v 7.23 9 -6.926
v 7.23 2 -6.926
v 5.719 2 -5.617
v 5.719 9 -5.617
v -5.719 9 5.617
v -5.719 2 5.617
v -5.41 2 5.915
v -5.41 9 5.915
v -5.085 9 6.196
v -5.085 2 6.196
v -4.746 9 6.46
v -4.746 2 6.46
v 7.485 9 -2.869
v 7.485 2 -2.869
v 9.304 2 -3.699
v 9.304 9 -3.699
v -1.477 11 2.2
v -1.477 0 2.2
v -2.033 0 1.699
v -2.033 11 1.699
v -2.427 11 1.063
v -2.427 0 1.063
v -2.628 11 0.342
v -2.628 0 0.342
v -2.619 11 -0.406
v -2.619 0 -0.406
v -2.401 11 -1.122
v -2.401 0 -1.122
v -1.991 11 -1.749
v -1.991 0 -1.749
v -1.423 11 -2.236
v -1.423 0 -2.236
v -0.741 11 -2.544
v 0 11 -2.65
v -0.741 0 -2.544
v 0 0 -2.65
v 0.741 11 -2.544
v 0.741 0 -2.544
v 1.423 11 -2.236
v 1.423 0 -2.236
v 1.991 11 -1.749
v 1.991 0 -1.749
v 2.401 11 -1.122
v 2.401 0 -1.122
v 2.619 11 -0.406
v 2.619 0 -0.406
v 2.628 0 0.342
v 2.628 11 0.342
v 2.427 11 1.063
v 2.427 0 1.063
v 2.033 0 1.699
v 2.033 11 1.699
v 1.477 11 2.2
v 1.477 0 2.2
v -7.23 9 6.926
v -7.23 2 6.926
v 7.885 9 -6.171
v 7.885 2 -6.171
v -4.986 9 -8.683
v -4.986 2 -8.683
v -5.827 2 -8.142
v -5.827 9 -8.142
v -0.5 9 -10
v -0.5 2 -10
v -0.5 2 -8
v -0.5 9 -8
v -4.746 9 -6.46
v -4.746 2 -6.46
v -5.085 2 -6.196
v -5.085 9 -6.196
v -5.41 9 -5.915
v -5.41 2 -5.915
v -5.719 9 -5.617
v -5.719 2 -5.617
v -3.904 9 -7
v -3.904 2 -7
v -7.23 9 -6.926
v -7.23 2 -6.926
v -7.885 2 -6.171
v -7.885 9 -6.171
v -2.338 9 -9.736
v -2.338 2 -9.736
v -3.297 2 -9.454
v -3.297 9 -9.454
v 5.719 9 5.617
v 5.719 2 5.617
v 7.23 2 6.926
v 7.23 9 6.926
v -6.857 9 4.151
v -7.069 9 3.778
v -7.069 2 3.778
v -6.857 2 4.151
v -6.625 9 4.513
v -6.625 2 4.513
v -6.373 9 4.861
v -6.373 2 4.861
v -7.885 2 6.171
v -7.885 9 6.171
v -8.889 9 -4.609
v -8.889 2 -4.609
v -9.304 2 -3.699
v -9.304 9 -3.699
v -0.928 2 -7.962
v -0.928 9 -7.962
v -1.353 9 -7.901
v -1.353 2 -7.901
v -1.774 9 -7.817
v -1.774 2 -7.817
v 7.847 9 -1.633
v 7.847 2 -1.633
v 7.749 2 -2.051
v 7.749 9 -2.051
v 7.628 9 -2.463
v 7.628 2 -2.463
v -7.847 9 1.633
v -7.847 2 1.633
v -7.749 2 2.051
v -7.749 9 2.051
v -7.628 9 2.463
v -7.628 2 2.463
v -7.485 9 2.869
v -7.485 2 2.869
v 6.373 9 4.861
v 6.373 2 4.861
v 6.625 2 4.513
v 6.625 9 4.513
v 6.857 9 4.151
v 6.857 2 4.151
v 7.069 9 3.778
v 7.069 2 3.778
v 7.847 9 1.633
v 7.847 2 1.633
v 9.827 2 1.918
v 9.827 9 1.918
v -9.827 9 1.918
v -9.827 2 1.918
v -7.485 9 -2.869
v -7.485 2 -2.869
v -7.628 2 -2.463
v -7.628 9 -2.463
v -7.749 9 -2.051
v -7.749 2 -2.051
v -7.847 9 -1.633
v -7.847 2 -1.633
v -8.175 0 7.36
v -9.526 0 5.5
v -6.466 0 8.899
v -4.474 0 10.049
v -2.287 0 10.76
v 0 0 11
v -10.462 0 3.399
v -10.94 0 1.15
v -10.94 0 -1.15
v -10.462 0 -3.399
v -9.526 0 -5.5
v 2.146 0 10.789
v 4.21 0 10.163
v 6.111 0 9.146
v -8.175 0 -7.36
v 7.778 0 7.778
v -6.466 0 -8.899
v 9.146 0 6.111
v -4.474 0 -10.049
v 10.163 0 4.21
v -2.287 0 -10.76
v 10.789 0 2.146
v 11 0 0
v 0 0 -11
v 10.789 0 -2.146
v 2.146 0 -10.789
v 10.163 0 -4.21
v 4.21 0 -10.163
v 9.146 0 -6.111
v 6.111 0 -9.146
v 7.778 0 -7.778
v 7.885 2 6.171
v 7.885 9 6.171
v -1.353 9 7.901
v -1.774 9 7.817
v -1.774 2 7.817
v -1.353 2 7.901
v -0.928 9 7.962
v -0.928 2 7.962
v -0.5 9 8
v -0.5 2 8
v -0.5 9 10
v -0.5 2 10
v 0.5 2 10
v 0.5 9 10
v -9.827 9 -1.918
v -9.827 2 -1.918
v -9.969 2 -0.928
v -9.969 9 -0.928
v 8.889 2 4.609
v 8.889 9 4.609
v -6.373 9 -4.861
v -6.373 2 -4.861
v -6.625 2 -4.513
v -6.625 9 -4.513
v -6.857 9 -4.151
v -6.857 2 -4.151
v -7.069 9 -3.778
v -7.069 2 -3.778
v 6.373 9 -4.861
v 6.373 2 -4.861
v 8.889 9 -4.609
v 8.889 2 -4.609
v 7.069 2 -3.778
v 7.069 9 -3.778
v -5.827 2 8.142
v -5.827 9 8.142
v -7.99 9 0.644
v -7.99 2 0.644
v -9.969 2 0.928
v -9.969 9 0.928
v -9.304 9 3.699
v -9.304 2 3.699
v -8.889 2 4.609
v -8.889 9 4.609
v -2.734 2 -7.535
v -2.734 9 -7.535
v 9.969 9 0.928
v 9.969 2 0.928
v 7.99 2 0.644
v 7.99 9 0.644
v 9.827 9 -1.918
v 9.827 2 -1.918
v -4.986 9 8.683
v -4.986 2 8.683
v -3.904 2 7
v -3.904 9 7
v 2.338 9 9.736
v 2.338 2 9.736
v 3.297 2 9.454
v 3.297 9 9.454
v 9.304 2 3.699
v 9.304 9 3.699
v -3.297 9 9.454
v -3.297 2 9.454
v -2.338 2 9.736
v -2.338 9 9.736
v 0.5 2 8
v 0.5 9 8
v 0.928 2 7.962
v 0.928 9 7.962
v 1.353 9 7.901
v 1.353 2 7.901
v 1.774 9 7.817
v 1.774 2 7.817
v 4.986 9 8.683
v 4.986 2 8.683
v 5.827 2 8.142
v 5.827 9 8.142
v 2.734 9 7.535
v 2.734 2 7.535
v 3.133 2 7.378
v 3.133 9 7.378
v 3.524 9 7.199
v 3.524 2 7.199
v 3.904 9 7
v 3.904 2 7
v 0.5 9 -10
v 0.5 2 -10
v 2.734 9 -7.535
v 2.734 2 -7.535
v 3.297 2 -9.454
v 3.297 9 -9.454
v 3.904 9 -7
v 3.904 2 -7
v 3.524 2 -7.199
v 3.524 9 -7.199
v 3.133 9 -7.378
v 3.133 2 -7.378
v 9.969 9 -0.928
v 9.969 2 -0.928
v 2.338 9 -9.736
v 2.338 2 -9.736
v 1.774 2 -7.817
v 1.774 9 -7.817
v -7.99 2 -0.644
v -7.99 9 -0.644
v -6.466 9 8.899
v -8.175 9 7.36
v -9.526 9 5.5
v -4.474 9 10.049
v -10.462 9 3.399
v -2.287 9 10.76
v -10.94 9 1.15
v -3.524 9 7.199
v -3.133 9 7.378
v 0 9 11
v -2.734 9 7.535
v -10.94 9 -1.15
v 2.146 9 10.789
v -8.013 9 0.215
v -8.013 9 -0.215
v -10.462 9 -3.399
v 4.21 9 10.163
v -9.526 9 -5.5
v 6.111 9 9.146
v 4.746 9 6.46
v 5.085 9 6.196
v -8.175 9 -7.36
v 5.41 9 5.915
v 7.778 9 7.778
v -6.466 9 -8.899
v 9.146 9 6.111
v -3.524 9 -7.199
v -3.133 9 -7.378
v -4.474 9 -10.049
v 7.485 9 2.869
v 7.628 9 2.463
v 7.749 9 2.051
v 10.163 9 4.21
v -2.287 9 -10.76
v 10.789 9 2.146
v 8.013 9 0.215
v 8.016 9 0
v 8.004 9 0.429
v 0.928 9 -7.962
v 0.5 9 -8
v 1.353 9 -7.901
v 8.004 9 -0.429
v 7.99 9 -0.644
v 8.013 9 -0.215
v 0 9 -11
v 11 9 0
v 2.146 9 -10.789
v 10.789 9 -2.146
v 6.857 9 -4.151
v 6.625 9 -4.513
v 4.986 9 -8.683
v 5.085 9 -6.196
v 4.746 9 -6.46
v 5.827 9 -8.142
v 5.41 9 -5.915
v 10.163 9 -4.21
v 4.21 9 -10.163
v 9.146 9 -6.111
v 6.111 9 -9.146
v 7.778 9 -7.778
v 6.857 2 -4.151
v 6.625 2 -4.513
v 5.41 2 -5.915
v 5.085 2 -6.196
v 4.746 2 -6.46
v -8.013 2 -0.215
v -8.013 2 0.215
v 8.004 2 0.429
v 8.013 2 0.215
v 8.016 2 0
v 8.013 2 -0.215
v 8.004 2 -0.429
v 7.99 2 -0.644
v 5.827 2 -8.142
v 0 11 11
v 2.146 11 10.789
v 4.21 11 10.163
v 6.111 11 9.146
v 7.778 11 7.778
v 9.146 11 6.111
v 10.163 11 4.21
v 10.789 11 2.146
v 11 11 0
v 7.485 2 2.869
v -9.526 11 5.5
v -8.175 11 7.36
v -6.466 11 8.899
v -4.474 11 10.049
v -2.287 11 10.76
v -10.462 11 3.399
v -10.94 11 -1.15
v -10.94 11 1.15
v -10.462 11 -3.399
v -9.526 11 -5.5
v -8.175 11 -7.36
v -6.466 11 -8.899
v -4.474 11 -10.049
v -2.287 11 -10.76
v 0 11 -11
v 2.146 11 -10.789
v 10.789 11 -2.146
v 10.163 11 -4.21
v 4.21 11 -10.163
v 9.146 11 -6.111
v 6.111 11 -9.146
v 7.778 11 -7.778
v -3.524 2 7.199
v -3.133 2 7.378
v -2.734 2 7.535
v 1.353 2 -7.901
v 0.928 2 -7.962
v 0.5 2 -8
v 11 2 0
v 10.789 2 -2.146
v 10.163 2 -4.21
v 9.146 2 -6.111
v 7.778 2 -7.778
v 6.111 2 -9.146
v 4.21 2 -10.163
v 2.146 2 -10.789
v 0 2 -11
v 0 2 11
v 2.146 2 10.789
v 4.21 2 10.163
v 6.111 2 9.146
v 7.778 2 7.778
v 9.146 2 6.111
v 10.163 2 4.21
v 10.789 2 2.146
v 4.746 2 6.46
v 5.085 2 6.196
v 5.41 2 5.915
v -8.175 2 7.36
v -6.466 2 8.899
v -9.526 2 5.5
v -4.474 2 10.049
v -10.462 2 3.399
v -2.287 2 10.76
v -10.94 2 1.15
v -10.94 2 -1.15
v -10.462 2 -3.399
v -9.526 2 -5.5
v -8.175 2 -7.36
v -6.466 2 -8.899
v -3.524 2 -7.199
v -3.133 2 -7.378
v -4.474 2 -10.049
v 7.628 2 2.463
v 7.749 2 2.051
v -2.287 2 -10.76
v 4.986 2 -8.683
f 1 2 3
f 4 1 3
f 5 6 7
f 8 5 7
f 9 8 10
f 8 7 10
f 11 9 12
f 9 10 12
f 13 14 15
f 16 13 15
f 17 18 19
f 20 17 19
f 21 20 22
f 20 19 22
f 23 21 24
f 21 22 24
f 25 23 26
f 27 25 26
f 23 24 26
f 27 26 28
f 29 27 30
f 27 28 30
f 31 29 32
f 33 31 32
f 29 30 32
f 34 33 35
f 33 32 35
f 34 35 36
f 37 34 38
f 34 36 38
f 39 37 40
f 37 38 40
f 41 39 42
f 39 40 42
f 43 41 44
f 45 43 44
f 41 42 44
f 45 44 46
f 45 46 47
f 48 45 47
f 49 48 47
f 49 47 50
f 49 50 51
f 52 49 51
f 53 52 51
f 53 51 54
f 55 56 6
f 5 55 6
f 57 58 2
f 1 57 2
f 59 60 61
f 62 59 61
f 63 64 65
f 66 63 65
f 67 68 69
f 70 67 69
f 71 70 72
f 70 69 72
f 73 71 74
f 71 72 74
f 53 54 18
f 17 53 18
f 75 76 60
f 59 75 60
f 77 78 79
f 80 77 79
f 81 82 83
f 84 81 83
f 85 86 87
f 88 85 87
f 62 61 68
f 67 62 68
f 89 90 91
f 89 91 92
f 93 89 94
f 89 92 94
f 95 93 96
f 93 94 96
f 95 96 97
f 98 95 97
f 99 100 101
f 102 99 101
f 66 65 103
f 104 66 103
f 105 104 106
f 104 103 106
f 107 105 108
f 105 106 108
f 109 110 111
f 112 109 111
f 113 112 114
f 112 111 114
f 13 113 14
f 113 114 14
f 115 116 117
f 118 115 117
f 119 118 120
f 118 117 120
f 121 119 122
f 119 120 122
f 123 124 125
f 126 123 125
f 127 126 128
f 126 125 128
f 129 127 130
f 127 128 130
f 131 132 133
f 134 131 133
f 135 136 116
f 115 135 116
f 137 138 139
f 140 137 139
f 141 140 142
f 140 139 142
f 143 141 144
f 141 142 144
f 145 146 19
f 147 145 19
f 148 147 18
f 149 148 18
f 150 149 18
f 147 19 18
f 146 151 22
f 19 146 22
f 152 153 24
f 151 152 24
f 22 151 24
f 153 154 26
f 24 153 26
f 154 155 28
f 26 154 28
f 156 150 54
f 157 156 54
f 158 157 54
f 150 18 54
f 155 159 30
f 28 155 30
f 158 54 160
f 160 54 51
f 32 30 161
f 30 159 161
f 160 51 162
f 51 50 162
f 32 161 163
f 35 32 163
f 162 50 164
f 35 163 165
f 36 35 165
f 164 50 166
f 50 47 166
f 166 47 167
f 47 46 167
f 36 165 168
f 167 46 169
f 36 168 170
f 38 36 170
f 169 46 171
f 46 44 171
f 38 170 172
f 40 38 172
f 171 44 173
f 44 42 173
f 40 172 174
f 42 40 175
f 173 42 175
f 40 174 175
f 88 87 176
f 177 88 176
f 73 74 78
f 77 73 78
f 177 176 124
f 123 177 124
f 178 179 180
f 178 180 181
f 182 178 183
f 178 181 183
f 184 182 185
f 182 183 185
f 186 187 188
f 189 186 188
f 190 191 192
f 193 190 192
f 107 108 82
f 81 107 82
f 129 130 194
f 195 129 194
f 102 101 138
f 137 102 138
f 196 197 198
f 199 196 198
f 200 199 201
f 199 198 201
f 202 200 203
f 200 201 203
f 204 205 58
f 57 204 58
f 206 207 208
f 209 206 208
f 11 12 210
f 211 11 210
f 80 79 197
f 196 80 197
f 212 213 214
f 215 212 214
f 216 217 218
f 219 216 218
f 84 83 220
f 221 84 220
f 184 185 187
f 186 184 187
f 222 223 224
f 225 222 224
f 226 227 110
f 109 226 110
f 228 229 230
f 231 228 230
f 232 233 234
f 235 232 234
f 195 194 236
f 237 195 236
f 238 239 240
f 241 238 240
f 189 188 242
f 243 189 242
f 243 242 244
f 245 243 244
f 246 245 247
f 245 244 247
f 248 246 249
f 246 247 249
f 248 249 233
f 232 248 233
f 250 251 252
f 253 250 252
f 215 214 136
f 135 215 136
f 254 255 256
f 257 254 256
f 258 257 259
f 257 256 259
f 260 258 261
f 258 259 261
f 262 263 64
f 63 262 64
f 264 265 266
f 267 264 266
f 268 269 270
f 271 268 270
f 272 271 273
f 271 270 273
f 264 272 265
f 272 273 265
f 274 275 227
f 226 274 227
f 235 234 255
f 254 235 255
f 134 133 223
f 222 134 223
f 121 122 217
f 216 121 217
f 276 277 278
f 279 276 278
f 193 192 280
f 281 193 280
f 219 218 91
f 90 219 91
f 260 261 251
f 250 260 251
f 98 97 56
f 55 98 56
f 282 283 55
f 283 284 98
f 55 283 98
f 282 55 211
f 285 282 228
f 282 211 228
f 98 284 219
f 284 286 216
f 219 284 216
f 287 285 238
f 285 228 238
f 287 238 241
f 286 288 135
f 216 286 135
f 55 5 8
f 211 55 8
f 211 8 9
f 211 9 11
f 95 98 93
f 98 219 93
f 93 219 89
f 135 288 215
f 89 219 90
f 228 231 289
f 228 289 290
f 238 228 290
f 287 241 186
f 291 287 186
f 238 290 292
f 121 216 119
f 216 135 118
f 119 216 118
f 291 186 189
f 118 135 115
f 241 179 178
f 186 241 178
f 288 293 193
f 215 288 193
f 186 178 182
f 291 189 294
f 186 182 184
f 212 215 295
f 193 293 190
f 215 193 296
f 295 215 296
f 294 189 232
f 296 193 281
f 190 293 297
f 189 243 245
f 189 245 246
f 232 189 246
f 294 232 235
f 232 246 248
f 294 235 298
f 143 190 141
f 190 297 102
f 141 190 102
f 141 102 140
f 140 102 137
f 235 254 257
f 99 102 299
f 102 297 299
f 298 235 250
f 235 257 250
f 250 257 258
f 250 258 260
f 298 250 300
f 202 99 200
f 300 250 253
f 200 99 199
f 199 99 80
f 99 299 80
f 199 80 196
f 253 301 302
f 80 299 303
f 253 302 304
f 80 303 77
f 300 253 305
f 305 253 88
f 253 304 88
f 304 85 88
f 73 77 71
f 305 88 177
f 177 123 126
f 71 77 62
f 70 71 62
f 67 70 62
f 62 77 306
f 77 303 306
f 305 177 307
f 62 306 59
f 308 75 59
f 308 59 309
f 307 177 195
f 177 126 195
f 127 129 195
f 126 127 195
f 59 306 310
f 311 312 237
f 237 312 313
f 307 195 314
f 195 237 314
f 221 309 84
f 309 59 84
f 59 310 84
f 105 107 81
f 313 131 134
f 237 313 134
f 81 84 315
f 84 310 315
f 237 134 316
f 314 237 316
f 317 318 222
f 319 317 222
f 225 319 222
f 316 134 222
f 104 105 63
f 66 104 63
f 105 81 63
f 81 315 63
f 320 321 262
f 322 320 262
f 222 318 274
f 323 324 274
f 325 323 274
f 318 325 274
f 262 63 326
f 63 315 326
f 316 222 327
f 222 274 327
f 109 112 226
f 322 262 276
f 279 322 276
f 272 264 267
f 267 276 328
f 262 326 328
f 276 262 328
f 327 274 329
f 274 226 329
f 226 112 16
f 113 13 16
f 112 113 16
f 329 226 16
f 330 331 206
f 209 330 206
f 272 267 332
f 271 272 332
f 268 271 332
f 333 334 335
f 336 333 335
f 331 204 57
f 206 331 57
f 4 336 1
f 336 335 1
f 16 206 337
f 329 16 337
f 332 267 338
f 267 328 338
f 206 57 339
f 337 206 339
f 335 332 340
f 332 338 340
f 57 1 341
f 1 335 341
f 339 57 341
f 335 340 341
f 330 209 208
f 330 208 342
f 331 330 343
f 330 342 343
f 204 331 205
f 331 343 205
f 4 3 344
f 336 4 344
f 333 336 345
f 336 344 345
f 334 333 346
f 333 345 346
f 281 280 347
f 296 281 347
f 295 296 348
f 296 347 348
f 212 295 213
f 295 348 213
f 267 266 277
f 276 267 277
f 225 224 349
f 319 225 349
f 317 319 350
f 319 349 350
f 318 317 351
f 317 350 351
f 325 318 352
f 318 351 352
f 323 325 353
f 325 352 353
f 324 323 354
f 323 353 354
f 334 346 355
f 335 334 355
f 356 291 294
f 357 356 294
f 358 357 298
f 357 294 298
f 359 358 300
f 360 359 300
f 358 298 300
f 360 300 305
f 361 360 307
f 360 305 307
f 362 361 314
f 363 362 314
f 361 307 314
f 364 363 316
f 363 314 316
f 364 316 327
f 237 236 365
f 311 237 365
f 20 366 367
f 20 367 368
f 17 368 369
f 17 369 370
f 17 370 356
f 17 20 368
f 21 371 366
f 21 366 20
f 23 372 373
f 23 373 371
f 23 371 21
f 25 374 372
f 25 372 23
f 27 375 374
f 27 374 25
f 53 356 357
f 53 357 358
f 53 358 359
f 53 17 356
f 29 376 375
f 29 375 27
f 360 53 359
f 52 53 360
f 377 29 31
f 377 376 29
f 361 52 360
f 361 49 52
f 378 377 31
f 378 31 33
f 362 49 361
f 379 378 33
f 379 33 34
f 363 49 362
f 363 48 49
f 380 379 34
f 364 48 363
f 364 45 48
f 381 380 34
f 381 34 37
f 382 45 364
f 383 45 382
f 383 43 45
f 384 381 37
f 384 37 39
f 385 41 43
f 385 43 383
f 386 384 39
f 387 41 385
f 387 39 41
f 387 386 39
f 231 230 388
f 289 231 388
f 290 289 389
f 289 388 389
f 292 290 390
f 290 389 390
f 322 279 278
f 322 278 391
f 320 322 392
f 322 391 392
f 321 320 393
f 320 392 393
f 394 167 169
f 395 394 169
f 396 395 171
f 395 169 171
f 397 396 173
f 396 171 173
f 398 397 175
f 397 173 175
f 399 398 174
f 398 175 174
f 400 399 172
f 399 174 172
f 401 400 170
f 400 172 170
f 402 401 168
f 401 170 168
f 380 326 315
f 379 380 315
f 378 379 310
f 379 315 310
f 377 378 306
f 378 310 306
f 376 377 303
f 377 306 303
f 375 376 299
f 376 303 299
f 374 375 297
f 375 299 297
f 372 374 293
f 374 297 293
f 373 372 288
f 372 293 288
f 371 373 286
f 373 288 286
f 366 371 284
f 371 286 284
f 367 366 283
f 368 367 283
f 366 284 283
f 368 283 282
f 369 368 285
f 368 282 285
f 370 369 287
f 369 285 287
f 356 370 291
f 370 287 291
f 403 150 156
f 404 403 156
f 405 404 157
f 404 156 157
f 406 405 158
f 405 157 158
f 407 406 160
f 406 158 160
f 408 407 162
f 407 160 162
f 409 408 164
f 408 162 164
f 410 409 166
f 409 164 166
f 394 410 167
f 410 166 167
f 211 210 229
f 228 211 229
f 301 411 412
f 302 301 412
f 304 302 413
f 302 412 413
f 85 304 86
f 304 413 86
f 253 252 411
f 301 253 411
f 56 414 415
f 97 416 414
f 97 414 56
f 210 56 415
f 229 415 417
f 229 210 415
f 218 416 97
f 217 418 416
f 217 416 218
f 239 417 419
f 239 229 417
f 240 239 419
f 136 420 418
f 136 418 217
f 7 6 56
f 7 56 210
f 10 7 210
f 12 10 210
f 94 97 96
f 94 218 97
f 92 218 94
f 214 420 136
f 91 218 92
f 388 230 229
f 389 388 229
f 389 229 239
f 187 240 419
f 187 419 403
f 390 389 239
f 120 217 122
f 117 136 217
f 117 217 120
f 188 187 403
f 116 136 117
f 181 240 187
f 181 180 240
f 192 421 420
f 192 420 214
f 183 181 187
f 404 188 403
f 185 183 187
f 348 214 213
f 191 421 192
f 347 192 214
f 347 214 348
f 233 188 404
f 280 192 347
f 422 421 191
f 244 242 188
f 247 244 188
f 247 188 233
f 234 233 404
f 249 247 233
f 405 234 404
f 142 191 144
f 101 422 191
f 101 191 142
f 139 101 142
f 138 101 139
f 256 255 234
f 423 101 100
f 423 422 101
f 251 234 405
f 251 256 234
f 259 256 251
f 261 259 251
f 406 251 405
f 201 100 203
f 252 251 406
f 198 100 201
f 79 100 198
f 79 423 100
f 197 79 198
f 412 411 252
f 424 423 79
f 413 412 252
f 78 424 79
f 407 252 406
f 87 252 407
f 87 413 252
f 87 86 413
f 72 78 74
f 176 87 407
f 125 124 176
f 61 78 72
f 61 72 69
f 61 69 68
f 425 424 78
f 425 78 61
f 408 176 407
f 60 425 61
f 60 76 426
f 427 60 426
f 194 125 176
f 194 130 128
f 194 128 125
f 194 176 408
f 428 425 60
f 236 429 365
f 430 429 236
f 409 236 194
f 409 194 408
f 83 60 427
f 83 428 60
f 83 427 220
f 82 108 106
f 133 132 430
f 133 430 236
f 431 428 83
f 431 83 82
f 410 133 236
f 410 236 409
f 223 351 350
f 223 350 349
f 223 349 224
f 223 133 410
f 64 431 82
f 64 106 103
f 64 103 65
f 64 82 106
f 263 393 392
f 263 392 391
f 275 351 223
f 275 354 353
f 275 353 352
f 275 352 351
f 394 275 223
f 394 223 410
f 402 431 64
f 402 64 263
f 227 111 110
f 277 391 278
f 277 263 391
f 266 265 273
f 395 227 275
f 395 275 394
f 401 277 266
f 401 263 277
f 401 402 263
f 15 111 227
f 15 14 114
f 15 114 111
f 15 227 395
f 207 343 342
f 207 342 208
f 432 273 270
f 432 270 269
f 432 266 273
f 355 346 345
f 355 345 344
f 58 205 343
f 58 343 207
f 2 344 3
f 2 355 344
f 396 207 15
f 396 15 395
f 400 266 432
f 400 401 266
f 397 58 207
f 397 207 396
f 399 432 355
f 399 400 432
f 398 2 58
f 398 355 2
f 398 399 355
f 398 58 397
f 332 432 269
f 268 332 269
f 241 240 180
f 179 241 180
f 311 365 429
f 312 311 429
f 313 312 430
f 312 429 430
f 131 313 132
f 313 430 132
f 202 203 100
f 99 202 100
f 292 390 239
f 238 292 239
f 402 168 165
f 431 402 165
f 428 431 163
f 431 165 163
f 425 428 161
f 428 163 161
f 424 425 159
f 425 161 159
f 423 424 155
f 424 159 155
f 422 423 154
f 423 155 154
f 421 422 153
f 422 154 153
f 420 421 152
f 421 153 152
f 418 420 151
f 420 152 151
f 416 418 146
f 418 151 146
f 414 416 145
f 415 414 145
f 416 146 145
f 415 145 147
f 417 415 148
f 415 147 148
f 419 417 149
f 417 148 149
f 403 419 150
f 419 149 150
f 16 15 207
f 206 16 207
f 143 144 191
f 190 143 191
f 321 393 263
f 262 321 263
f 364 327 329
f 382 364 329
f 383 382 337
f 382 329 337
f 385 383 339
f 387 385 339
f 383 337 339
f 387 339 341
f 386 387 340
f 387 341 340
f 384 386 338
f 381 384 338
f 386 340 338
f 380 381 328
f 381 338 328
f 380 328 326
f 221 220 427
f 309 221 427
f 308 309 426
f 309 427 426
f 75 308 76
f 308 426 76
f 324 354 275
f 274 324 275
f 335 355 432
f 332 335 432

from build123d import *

# Parameters (mm, degrees)
BOSS_EXTRUDE1_DEPTH = 11
BOSS_EXTRUDE2_DEPTH = 2
BOSS_EXTRUDE3_START = 9
BOSS_EXTRUDE3_DEPTH = 2


# Read off the part's stored shape, not the designer's step: Boss-Extrude1
with BuildPart() as part:
    # Boss-Extrude1 outline → Boss-Extrude1 (new body)
    with BuildSketch(Plane(origin=(0, 0, 0), x_dir=(1, 0, 0), z_dir=(0, 1, 0))):
        with BuildLine():
            Line((-0.5, -8), (-0.5, -10))
            Line((-0.5, -10), (0.5, -10))
            Line((0.5, -10), (0.5, -8))
            ThreePointArc((0.5, -8), (1.140740208, -7.934022421), (1.774113968, -7.816810067))
            Line((1.774113968, -7.816810067), (2.337579082, -9.735796015))
            Line((2.337579082, -9.735796015), (3.297072055, -9.454063458))
            Line((3.297072055, -9.454063458), (2.733606942, -7.53507751))
            ThreePointArc((2.733606942, -7.53507751), (3.329804637, -7.29125511), (3.904499773, -7.000348671))
            Line((3.904499773, -7.000348671), (4.985781408, -8.682855737))
            Line((4.985781408, -8.682855737), (5.827034941, -8.14221492))
            Line((5.827034941, -8.14221492), (4.745753306, -6.459707854))
            ThreePointArc((4.745753306, -6.459707854), (5.249108098, -6.057793673), (5.718566228, -5.616760659))
            Line((5.718566228, -5.616760659), (7.230065377, -6.926482127))
            Line((7.230065377, -6.926482127), (7.884926111, -6.170732552))
            Line((7.884926111, -6.170732552), (6.373426962, -4.861011084))
            ThreePointArc((6.373426962, -4.861011084), (6.743160038, -4.333565819), (7.069348456, -3.778136102))
            Line((7.069348456, -3.778136102), (8.888612447, -4.608966128))
            Line((8.888612447, -4.608966128), (9.30402746, -3.699334132))
            Line((9.30402746, -3.699334132), (7.484763469, -2.868504106))
            ThreePointArc((7.484763469, -2.868504106), (7.690921254, -2.258258235), (7.847414116, -1.633429427))
            Line((7.847414116, -1.633429427), (9.827057, -1.918059104))
            Line((9.827057, -1.918059104), (9.969371838, -0.928237662))
            Line((9.969371838, -0.928237662), (7.989728954, -0.643607985))
            ThreePointArc((7.989728954, -0.643607985), (8.015609771, 0), (7.989728954, 0.643607985))
            Line((7.989728954, 0.643607985), (9.969371838, 0.928237662))
            Line((9.969371838, 0.928237662), (9.827057, 1.918059104))
            Line((9.827057, 1.918059104), (7.847414116, 1.633429427))
            ThreePointArc((7.847414116, 1.633429427), (7.690921254, 2.258258235), (7.484763469, 2.868504106))
            Line((7.484763469, 2.868504106), (9.30402746, 3.699334132))
            Line((9.30402746, 3.699334132), (8.888612447, 4.608966128))
            Line((8.888612447, 4.608966128), (7.069348456, 3.778136102))
            ThreePointArc((7.069348456, 3.778136102), (6.743160038, 4.333565819), (6.373426962, 4.861011084))
            Line((6.373426962, 4.861011084), (7.884926111, 6.170732552))
            Line((7.884926111, 6.170732552), (7.230065377, 6.926482127))
            Line((7.230065377, 6.926482127), (5.718566228, 5.616760659))
            ThreePointArc((5.718566228, 5.616760659), (5.249108098, 6.057793673), (4.745753306, 6.459707854))
            Line((4.745753306, 6.459707854), (5.827034941, 8.14221492))
            Line((5.827034941, 8.14221492), (4.985781408, 8.682855737))
            Line((4.985781408, 8.682855737), (3.904499773, 7.000348671))
            ThreePointArc((3.904499773, 7.000348671), (3.329804637, 7.29125511), (2.733606942, 7.53507751))
            Line((2.733606942, 7.53507751), (3.297072055, 9.454063458))
            Line((3.297072055, 9.454063458), (2.337579082, 9.735796015))
            Line((2.337579082, 9.735796015), (1.774113968, 7.816810067))
            ThreePointArc((1.774113968, 7.816810067), (1.140740208, 7.934022421), (0.5, 8))
            Line((0.5, 8), (0.5, 10))
            Line((0.5, 10), (-0.5, 10))
            Line((-0.5, 10), (-0.5, 8))
            ThreePointArc((-0.5, 8), (-1.140740208, 7.934022421), (-1.774113968, 7.816810067))
            Line((-1.774113968, 7.816810067), (-2.337579082, 9.735796015))
            Line((-2.337579082, 9.735796015), (-3.297072055, 9.454063458))
            Line((-3.297072055, 9.454063458), (-2.733606942, 7.53507751))
            ThreePointArc((-2.733606942, 7.53507751), (-3.329804637, 7.29125511), (-3.904499773, 7.000348671))
            Line((-3.904499773, 7.000348671), (-4.985781408, 8.682855737))
            Line((-4.985781408, 8.682855737), (-5.827034941, 8.14221492))
            Line((-5.827034941, 8.14221492), (-4.745753306, 6.459707854))
            ThreePointArc((-4.745753306, 6.459707854), (-5.249108098, 6.057793673), (-5.718566228, 5.616760659))
            Line((-5.718566228, 5.616760659), (-7.230065377, 6.926482127))
            Line((-7.230065377, 6.926482127), (-7.884926111, 6.170732552))
            Line((-7.884926111, 6.170732552), (-6.373426962, 4.861011084))
            ThreePointArc((-6.373426962, 4.861011084), (-6.743160038, 4.333565819), (-7.069348456, 3.778136102))
            Line((-7.069348456, 3.778136102), (-8.888612447, 4.608966128))
            Line((-8.888612447, 4.608966128), (-9.30402746, 3.699334132))
            Line((-9.30402746, 3.699334132), (-7.484763469, 2.868504106))
            ThreePointArc((-7.484763469, 2.868504106), (-7.690921254, 2.258258235), (-7.847414116, 1.633429427))
            Line((-7.847414116, 1.633429427), (-9.827057, 1.918059104))
            Line((-9.827057, 1.918059104), (-9.969371838, 0.928237662))
            Line((-9.969371838, 0.928237662), (-7.989728954, 0.643607985))
            ThreePointArc((-7.989728954, 0.643607985), (-8.015609771, 0), (-7.989728954, -0.643607985))
            Line((-7.989728954, -0.643607985), (-9.969371838, -0.928237662))
            Line((-9.969371838, -0.928237662), (-9.827057, -1.918059104))
            Line((-9.827057, -1.918059104), (-7.847414116, -1.633429427))
            ThreePointArc((-7.847414116, -1.633429427), (-7.690921254, -2.258258235), (-7.484763469, -2.868504106))
            Line((-7.484763469, -2.868504106), (-9.30402746, -3.699334132))
            Line((-9.30402746, -3.699334132), (-8.888612447, -4.608966128))
            Line((-8.888612447, -4.608966128), (-7.069348456, -3.778136102))
            ThreePointArc((-7.069348456, -3.778136102), (-6.743160038, -4.333565819), (-6.373426962, -4.861011084))
            Line((-6.373426962, -4.861011084), (-7.884926111, -6.170732552))
            Line((-7.884926111, -6.170732552), (-7.230065377, -6.926482127))
            Line((-7.230065377, -6.926482127), (-5.718566228, -5.616760659))
            ThreePointArc((-5.718566228, -5.616760659), (-5.249108098, -6.057793673), (-4.745753306, -6.459707854))
            Line((-4.745753306, -6.459707854), (-5.827034941, -8.14221492))
            Line((-5.827034941, -8.14221492), (-4.985781408, -8.682855737))
            Line((-4.985781408, -8.682855737), (-3.904499773, -7.000348671))
            ThreePointArc((-3.904499773, -7.000348671), (-3.329804637, -7.29125511), (-2.733606942, -7.53507751))
            Line((-2.733606942, -7.53507751), (-3.297072055, -9.454063458))
            Line((-3.297072055, -9.454063458), (-2.337579082, -9.735796015))
            Line((-2.337579082, -9.735796015), (-1.774113968, -7.816810067))
            ThreePointArc((-1.774113968, -7.816810067), (-1.140740208, -7.934022421), (-0.5, -8))
        make_face()
        with BuildLine():
            Line((1.47732867, -2.2), (-1.47732867, -2.2))
            ThreePointArc((-1.47732867, -2.2), (0, 2.65), (1.47732867, -2.2))
        make_face(mode=Mode.SUBTRACT)
    extrude(amount=BOSS_EXTRUDE1_DEPTH)

    # Sketch1<6> → Boss-Extrude2 (add)
    with BuildSketch(Plane(origin=(0, 0, 0), x_dir=(1, 0, 0), z_dir=(0, 1, 0))):
        with BuildLine():
            Line((0, 10), (0, 11))
            ThreePointArc((0, 11), (-11, 0), (0, -11))
            Line((0, -11), (0, -10))
            Line((0, -10), (-0.5, -10))
            Line((-0.5, -10), (-0.5, -8))
            ThreePointArc((-0.5, -8), (-1.140740208, -7.934022421), (-1.774113968, -7.816810067))
            Line((-1.774113968, -7.816810067), (-2.337579082, -9.735796015))
            Line((-2.337579082, -9.735796015), (-3.297072055, -9.454063458))
            Line((-3.297072055, -9.454063458), (-2.733606942, -7.53507751))
            ThreePointArc((-2.733606942, -7.53507751), (-3.329804637, -7.29125511), (-3.904499773, -7.000348671))
            Line((-3.904499773, -7.000348671), (-4.985781408, -8.682855737))
            Line((-4.985781408, -8.682855737), (-5.827034941, -8.14221492))
            Line((-5.827034941, -8.14221492), (-4.745753306, -6.459707854))
            ThreePointArc((-4.745753306, -6.459707854), (-5.249108098, -6.057793673), (-5.718566228, -5.616760659))
            Line((-5.718566228, -5.616760659), (-7.230065377, -6.926482127))
            Line((-7.230065377, -6.926482127), (-7.884926111, -6.170732552))
            Line((-7.884926111, -6.170732552), (-6.373426962, -4.861011084))
            ThreePointArc((-6.373426962, -4.861011084), (-6.743160038, -4.333565819), (-7.069348456, -3.778136102))
            Line((-7.069348456, -3.778136102), (-8.888612447, -4.608966128))
            Line((-8.888612447, -4.608966128), (-9.30402746, -3.699334132))
            Line((-9.30402746, -3.699334132), (-7.484763469, -2.868504106))
            ThreePointArc((-7.484763469, -2.868504106), (-7.690921254, -2.258258235), (-7.847414116, -1.633429427))
            Line((-7.847414116, -1.633429427), (-9.827057, -1.918059104))
            Line((-9.827057, -1.918059104), (-9.969371838, -0.928237662))
            Line((-9.969371838, -0.928237662), (-7.989728954, -0.643607985))
            ThreePointArc((-7.989728954, -0.643607985), (-8.015609771, 0), (-7.989728954, 0.643607985))
            Line((-7.989728954, 0.643607985), (-9.969371838, 0.928237662))
            Line((-9.969371838, 0.928237662), (-9.827057, 1.918059104))
            Line((-9.827057, 1.918059104), (-7.847414116, 1.633429427))
            ThreePointArc((-7.847414116, 1.633429427), (-7.690921254, 2.258258235), (-7.484763469, 2.868504106))
            Line((-7.484763469, 2.868504106), (-9.30402746, 3.699334132))
            Line((-9.30402746, 3.699334132), (-8.888612447, 4.608966128))
            Line((-8.888612447, 4.608966128), (-7.069348456, 3.778136102))
            ThreePointArc((-7.069348456, 3.778136102), (-6.743160038, 4.333565819), (-6.373426962, 4.861011084))
            Line((-6.373426962, 4.861011084), (-7.884926111, 6.170732552))
            Line((-7.884926111, 6.170732552), (-7.230065377, 6.926482127))
            Line((-7.230065377, 6.926482127), (-5.718566228, 5.616760659))
            ThreePointArc((-5.718566228, 5.616760659), (-5.249108098, 6.057793673), (-4.745753306, 6.459707854))
            Line((-4.745753306, 6.459707854), (-5.827034941, 8.14221492))
            Line((-5.827034941, 8.14221492), (-4.985781408, 8.682855737))
            Line((-4.985781408, 8.682855737), (-3.904499773, 7.000348671))
            ThreePointArc((-3.904499773, 7.000348671), (-3.329804637, 7.29125511), (-2.733606942, 7.53507751))
            Line((-2.733606942, 7.53507751), (-3.297072055, 9.454063458))
            Line((-3.297072055, 9.454063458), (-2.337579082, 9.735796015))
            Line((-2.337579082, 9.735796015), (-1.774113968, 7.816810067))
            ThreePointArc((-1.774113968, 7.816810067), (-1.140740208, 7.934022421), (-0.5, 8))
            Line((-0.5, 8), (-0.5, 10))
            Line((-0.5, 10), (0, 10))
        make_face()
        with BuildLine():
            ThreePointArc((11, 0), (7.778174593, 7.778174593), (0, 11))
            Line((0, 11), (0, 10))
            Line((0, 10), (0.5, 10))
            Line((0.5, 10), (0.5, 8))
            ThreePointArc((0.5, 8), (1.140740208, 7.934022421), (1.774113968, 7.816810067))
            Line((1.774113968, 7.816810067), (2.337579082, 9.735796015))
            Line((2.337579082, 9.735796015), (3.297072055, 9.454063458))
            Line((3.297072055, 9.454063458), (2.733606942, 7.53507751))
            ThreePointArc((2.733606942, 7.53507751), (3.329804637, 7.29125511), (3.904499773, 7.000348671))
            Line((3.904499773, 7.000348671), (4.985781408, 8.682855737))
            Line((4.985781408, 8.682855737), (5.827034941, 8.14221492))
            Line((5.827034941, 8.14221492), (4.745753306, 6.459707854))
            ThreePointArc((4.745753306, 6.459707854), (5.249108098, 6.057793673), (5.718566228, 5.616760659))
            Line((5.718566228, 5.616760659), (7.230065377, 6.926482127))
            Line((7.230065377, 6.926482127), (7.884926111, 6.170732552))
            Line((7.884926111, 6.170732552), (6.373426962, 4.861011084))
            ThreePointArc((6.373426962, 4.861011084), (6.743160038, 4.333565819), (7.069348456, 3.778136102))
            Line((7.069348456, 3.778136102), (8.888612447, 4.608966128))
            Line((8.888612447, 4.608966128), (9.30402746, 3.699334132))
            Line((9.30402746, 3.699334132), (7.484763469, 2.868504106))
            ThreePointArc((7.484763469, 2.868504106), (7.690921254, 2.258258235), (7.847414116, 1.633429427))
            Line((7.847414116, 1.633429427), (9.827057, 1.918059104))
            Line((9.827057, 1.918059104), (9.969371838, 0.928237662))
            Line((9.969371838, 0.928237662), (7.989728954, 0.643607985))
            ThreePointArc((7.989728954, 0.643607985), (8.009136953, 0.322064068), (8.015609771, 0))
            ThreePointArc((8.015609771, 0), (8.009136953, -0.322064068), (7.989728954, -0.643607985))
            Line((7.989728954, -0.643607985), (9.969371838, -0.928237662))
            Line((9.969371838, -0.928237662), (9.827057, -1.918059104))
            Line((9.827057, -1.918059104), (7.847414116, -1.633429427))
            ThreePointArc((7.847414116, -1.633429427), (7.690921254, -2.258258235), (7.484763469, -2.868504106))
            Line((7.484763469, -2.868504106), (9.30402746, -3.699334132))
            Line((9.30402746, -3.699334132), (8.888612447, -4.608966128))
            Line((8.888612447, -4.608966128), (7.069348456, -3.778136102))
            ThreePointArc((7.069348456, -3.778136102), (6.743160038, -4.333565819), (6.373426962, -4.861011084))
            Line((6.373426962, -4.861011084), (7.884926111, -6.170732552))
            Line((7.884926111, -6.170732552), (7.230065377, -6.926482127))
            Line((7.230065377, -6.926482127), (5.718566228, -5.616760659))
            ThreePointArc((5.718566228, -5.616760659), (5.249108098, -6.057793673), (4.745753306, -6.459707854))
            Line((4.745753306, -6.459707854), (5.827034941, -8.14221492))
            Line((5.827034941, -8.14221492), (4.985781408, -8.682855737))
            Line((4.985781408, -8.682855737), (3.904499773, -7.000348671))
            ThreePointArc((3.904499773, -7.000348671), (3.329804637, -7.29125511), (2.733606942, -7.53507751))
            Line((2.733606942, -7.53507751), (3.297072055, -9.454063458))
            Line((3.297072055, -9.454063458), (2.337579082, -9.735796015))
            Line((2.337579082, -9.735796015), (1.774113968, -7.816810067))
            ThreePointArc((1.774113968, -7.816810067), (1.140740208, -7.934022421), (0.5, -8))
            Line((0.5, -8), (0.5, -10))
            Line((0.5, -10), (0, -10))
            Line((0, -10), (0, -11))
            ThreePointArc((0, -11), (7.778174593, -7.778174593), (11, 0))
        make_face()
    extrude(amount=BOSS_EXTRUDE2_DEPTH)

    # Sketch1<7> → Boss-Extrude3 (add)
    with BuildSketch(Plane(origin=(0, 0, 0), x_dir=(1, 0, 0), z_dir=(0, 1, 0)).offset(BOSS_EXTRUDE3_START)):
        with BuildLine():
            ThreePointArc((11, 0), (7.778174593, 7.778174593), (0, 11))
            Line((0, 11), (0, 10))
            Line((0, 10), (0.5, 10))
            Line((0.5, 10), (0.5, 8))
            ThreePointArc((0.5, 8), (1.140740208, 7.934022421), (1.774113968, 7.816810067))
            Line((1.774113968, 7.816810067), (2.337579082, 9.735796015))
            Line((2.337579082, 9.735796015), (3.297072055, 9.454063458))
            Line((3.297072055, 9.454063458), (2.733606942, 7.53507751))
            ThreePointArc((2.733606942, 7.53507751), (3.329804637, 7.29125511), (3.904499773, 7.000348671))
            Line((3.904499773, 7.000348671), (4.985781408, 8.682855737))
            Line((4.985781408, 8.682855737), (5.827034941, 8.14221492))
            Line((5.827034941, 8.14221492), (4.745753306, 6.459707854))
            ThreePointArc((4.745753306, 6.459707854), (5.249108098, 6.057793673), (5.718566228, 5.616760659))
            Line((5.718566228, 5.616760659), (7.230065377, 6.926482127))
            Line((7.230065377, 6.926482127), (7.884926111, 6.170732552))
            Line((7.884926111, 6.170732552), (6.373426962, 4.861011084))
            ThreePointArc((6.373426962, 4.861011084), (6.743160038, 4.333565819), (7.069348456, 3.778136102))
            Line((7.069348456, 3.778136102), (8.888612447, 4.608966128))
            Line((8.888612447, 4.608966128), (9.30402746, 3.699334132))
            Line((9.30402746, 3.699334132), (7.484763469, 2.868504106))
            ThreePointArc((7.484763469, 2.868504106), (7.690921254, 2.258258235), (7.847414116, 1.633429427))
            Line((7.847414116, 1.633429427), (9.827057, 1.918059104))
            Line((9.827057, 1.918059104), (9.969371838, 0.928237662))
            Line((9.969371838, 0.928237662), (7.989728954, 0.643607985))
            ThreePointArc((7.989728954, 0.643607985), (8.009136953, 0.322064068), (8.015609771, 0))
            ThreePointArc((8.015609771, 0), (8.009136953, -0.322064068), (7.989728954, -0.643607985))
            Line((7.989728954, -0.643607985), (9.969371838, -0.928237662))
            Line((9.969371838, -0.928237662), (9.827057, -1.918059104))
            Line((9.827057, -1.918059104), (7.847414116, -1.633429427))
            ThreePointArc((7.847414116, -1.633429427), (7.690921254, -2.258258235), (7.484763469, -2.868504106))
            Line((7.484763469, -2.868504106), (9.30402746, -3.699334132))
            Line((9.30402746, -3.699334132), (8.888612447, -4.608966128))
            Line((8.888612447, -4.608966128), (7.069348456, -3.778136102))
            ThreePointArc((7.069348456, -3.778136102), (6.743160038, -4.333565819), (6.373426962, -4.861011084))
            Line((6.373426962, -4.861011084), (7.884926111, -6.170732552))
            Line((7.884926111, -6.170732552), (7.230065377, -6.926482127))
            Line((7.230065377, -6.926482127), (5.718566228, -5.616760659))
            ThreePointArc((5.718566228, -5.616760659), (5.249108098, -6.057793673), (4.745753306, -6.459707854))
            Line((4.745753306, -6.459707854), (5.827034941, -8.14221492))
            Line((5.827034941, -8.14221492), (4.985781408, -8.682855737))
            Line((4.985781408, -8.682855737), (3.904499773, -7.000348671))
            ThreePointArc((3.904499773, -7.000348671), (3.329804637, -7.29125511), (2.733606942, -7.53507751))
            Line((2.733606942, -7.53507751), (3.297072055, -9.454063458))
            Line((3.297072055, -9.454063458), (2.337579082, -9.735796015))
            Line((2.337579082, -9.735796015), (1.774113968, -7.816810067))
            ThreePointArc((1.774113968, -7.816810067), (1.140740208, -7.934022421), (0.5, -8))
            Line((0.5, -8), (0.5, -10))
            Line((0.5, -10), (0, -10))
            Line((0, -10), (0, -11))
            ThreePointArc((0, -11), (7.778174593, -7.778174593), (11, 0))
        make_face()
        with BuildLine():
            Line((0, 10), (0, 11))
            ThreePointArc((0, 11), (-11, 0), (0, -11))
            Line((0, -11), (0, -10))
            Line((0, -10), (-0.5, -10))
            Line((-0.5, -10), (-0.5, -8))
            ThreePointArc((-0.5, -8), (-1.140740208, -7.934022421), (-1.774113968, -7.816810067))
            Line((-1.774113968, -7.816810067), (-2.337579082, -9.735796015))
            Line((-2.337579082, -9.735796015), (-3.297072055, -9.454063458))
            Line((-3.297072055, -9.454063458), (-2.733606942, -7.53507751))
            ThreePointArc((-2.733606942, -7.53507751), (-3.329804637, -7.29125511), (-3.904499773, -7.000348671))
            Line((-3.904499773, -7.000348671), (-4.985781408, -8.682855737))
            Line((-4.985781408, -8.682855737), (-5.827034941, -8.14221492))
            Line((-5.827034941, -8.14221492), (-4.745753306, -6.459707854))
            ThreePointArc((-4.745753306, -6.459707854), (-5.249108098, -6.057793673), (-5.718566228, -5.616760659))
            Line((-5.718566228, -5.616760659), (-7.230065377, -6.926482127))
            Line((-7.230065377, -6.926482127), (-7.884926111, -6.170732552))
            Line((-7.884926111, -6.170732552), (-6.373426962, -4.861011084))
            ThreePointArc((-6.373426962, -4.861011084), (-6.743160038, -4.333565819), (-7.069348456, -3.778136102))
            Line((-7.069348456, -3.778136102), (-8.888612447, -4.608966128))
            Line((-8.888612447, -4.608966128), (-9.30402746, -3.699334132))
            Line((-9.30402746, -3.699334132), (-7.484763469, -2.868504106))
            ThreePointArc((-7.484763469, -2.868504106), (-7.690921254, -2.258258235), (-7.847414116, -1.633429427))
            Line((-7.847414116, -1.633429427), (-9.827057, -1.918059104))
            Line((-9.827057, -1.918059104), (-9.969371838, -0.928237662))
            Line((-9.969371838, -0.928237662), (-7.989728954, -0.643607985))
            ThreePointArc((-7.989728954, -0.643607985), (-8.015609771, 0), (-7.989728954, 0.643607985))
            Line((-7.989728954, 0.643607985), (-9.969371838, 0.928237662))
            Line((-9.969371838, 0.928237662), (-9.827057, 1.918059104))
            Line((-9.827057, 1.918059104), (-7.847414116, 1.633429427))
            ThreePointArc((-7.847414116, 1.633429427), (-7.690921254, 2.258258235), (-7.484763469, 2.868504106))
            Line((-7.484763469, 2.868504106), (-9.30402746, 3.699334132))
            Line((-9.30402746, 3.699334132), (-8.888612447, 4.608966128))
            Line((-8.888612447, 4.608966128), (-7.069348456, 3.778136102))
            ThreePointArc((-7.069348456, 3.778136102), (-6.743160038, 4.333565819), (-6.373426962, 4.861011084))
            Line((-6.373426962, 4.861011084), (-7.884926111, 6.170732552))
            Line((-7.884926111, 6.170732552), (-7.230065377, 6.926482127))
            Line((-7.230065377, 6.926482127), (-5.718566228, 5.616760659))
            ThreePointArc((-5.718566228, 5.616760659), (-5.249108098, 6.057793673), (-4.745753306, 6.459707854))
            Line((-4.745753306, 6.459707854), (-5.827034941, 8.14221492))
            Line((-5.827034941, 8.14221492), (-4.985781408, 8.682855737))
            Line((-4.985781408, 8.682855737), (-3.904499773, 7.000348671))
            ThreePointArc((-3.904499773, 7.000348671), (-3.329804637, 7.29125511), (-2.733606942, 7.53507751))
            Line((-2.733606942, 7.53507751), (-3.297072055, 9.454063458))
            Line((-3.297072055, 9.454063458), (-2.337579082, 9.735796015))
            Line((-2.337579082, 9.735796015), (-1.774113968, 7.816810067))
            ThreePointArc((-1.774113968, 7.816810067), (-1.140740208, 7.934022421), (-0.5, 8))
            Line((-0.5, 8), (-0.5, 10))
            Line((-0.5, 10), (0, 10))
        make_face()
    extrude(amount=BOSS_EXTRUDE3_DEPTH)


solid = part.part
